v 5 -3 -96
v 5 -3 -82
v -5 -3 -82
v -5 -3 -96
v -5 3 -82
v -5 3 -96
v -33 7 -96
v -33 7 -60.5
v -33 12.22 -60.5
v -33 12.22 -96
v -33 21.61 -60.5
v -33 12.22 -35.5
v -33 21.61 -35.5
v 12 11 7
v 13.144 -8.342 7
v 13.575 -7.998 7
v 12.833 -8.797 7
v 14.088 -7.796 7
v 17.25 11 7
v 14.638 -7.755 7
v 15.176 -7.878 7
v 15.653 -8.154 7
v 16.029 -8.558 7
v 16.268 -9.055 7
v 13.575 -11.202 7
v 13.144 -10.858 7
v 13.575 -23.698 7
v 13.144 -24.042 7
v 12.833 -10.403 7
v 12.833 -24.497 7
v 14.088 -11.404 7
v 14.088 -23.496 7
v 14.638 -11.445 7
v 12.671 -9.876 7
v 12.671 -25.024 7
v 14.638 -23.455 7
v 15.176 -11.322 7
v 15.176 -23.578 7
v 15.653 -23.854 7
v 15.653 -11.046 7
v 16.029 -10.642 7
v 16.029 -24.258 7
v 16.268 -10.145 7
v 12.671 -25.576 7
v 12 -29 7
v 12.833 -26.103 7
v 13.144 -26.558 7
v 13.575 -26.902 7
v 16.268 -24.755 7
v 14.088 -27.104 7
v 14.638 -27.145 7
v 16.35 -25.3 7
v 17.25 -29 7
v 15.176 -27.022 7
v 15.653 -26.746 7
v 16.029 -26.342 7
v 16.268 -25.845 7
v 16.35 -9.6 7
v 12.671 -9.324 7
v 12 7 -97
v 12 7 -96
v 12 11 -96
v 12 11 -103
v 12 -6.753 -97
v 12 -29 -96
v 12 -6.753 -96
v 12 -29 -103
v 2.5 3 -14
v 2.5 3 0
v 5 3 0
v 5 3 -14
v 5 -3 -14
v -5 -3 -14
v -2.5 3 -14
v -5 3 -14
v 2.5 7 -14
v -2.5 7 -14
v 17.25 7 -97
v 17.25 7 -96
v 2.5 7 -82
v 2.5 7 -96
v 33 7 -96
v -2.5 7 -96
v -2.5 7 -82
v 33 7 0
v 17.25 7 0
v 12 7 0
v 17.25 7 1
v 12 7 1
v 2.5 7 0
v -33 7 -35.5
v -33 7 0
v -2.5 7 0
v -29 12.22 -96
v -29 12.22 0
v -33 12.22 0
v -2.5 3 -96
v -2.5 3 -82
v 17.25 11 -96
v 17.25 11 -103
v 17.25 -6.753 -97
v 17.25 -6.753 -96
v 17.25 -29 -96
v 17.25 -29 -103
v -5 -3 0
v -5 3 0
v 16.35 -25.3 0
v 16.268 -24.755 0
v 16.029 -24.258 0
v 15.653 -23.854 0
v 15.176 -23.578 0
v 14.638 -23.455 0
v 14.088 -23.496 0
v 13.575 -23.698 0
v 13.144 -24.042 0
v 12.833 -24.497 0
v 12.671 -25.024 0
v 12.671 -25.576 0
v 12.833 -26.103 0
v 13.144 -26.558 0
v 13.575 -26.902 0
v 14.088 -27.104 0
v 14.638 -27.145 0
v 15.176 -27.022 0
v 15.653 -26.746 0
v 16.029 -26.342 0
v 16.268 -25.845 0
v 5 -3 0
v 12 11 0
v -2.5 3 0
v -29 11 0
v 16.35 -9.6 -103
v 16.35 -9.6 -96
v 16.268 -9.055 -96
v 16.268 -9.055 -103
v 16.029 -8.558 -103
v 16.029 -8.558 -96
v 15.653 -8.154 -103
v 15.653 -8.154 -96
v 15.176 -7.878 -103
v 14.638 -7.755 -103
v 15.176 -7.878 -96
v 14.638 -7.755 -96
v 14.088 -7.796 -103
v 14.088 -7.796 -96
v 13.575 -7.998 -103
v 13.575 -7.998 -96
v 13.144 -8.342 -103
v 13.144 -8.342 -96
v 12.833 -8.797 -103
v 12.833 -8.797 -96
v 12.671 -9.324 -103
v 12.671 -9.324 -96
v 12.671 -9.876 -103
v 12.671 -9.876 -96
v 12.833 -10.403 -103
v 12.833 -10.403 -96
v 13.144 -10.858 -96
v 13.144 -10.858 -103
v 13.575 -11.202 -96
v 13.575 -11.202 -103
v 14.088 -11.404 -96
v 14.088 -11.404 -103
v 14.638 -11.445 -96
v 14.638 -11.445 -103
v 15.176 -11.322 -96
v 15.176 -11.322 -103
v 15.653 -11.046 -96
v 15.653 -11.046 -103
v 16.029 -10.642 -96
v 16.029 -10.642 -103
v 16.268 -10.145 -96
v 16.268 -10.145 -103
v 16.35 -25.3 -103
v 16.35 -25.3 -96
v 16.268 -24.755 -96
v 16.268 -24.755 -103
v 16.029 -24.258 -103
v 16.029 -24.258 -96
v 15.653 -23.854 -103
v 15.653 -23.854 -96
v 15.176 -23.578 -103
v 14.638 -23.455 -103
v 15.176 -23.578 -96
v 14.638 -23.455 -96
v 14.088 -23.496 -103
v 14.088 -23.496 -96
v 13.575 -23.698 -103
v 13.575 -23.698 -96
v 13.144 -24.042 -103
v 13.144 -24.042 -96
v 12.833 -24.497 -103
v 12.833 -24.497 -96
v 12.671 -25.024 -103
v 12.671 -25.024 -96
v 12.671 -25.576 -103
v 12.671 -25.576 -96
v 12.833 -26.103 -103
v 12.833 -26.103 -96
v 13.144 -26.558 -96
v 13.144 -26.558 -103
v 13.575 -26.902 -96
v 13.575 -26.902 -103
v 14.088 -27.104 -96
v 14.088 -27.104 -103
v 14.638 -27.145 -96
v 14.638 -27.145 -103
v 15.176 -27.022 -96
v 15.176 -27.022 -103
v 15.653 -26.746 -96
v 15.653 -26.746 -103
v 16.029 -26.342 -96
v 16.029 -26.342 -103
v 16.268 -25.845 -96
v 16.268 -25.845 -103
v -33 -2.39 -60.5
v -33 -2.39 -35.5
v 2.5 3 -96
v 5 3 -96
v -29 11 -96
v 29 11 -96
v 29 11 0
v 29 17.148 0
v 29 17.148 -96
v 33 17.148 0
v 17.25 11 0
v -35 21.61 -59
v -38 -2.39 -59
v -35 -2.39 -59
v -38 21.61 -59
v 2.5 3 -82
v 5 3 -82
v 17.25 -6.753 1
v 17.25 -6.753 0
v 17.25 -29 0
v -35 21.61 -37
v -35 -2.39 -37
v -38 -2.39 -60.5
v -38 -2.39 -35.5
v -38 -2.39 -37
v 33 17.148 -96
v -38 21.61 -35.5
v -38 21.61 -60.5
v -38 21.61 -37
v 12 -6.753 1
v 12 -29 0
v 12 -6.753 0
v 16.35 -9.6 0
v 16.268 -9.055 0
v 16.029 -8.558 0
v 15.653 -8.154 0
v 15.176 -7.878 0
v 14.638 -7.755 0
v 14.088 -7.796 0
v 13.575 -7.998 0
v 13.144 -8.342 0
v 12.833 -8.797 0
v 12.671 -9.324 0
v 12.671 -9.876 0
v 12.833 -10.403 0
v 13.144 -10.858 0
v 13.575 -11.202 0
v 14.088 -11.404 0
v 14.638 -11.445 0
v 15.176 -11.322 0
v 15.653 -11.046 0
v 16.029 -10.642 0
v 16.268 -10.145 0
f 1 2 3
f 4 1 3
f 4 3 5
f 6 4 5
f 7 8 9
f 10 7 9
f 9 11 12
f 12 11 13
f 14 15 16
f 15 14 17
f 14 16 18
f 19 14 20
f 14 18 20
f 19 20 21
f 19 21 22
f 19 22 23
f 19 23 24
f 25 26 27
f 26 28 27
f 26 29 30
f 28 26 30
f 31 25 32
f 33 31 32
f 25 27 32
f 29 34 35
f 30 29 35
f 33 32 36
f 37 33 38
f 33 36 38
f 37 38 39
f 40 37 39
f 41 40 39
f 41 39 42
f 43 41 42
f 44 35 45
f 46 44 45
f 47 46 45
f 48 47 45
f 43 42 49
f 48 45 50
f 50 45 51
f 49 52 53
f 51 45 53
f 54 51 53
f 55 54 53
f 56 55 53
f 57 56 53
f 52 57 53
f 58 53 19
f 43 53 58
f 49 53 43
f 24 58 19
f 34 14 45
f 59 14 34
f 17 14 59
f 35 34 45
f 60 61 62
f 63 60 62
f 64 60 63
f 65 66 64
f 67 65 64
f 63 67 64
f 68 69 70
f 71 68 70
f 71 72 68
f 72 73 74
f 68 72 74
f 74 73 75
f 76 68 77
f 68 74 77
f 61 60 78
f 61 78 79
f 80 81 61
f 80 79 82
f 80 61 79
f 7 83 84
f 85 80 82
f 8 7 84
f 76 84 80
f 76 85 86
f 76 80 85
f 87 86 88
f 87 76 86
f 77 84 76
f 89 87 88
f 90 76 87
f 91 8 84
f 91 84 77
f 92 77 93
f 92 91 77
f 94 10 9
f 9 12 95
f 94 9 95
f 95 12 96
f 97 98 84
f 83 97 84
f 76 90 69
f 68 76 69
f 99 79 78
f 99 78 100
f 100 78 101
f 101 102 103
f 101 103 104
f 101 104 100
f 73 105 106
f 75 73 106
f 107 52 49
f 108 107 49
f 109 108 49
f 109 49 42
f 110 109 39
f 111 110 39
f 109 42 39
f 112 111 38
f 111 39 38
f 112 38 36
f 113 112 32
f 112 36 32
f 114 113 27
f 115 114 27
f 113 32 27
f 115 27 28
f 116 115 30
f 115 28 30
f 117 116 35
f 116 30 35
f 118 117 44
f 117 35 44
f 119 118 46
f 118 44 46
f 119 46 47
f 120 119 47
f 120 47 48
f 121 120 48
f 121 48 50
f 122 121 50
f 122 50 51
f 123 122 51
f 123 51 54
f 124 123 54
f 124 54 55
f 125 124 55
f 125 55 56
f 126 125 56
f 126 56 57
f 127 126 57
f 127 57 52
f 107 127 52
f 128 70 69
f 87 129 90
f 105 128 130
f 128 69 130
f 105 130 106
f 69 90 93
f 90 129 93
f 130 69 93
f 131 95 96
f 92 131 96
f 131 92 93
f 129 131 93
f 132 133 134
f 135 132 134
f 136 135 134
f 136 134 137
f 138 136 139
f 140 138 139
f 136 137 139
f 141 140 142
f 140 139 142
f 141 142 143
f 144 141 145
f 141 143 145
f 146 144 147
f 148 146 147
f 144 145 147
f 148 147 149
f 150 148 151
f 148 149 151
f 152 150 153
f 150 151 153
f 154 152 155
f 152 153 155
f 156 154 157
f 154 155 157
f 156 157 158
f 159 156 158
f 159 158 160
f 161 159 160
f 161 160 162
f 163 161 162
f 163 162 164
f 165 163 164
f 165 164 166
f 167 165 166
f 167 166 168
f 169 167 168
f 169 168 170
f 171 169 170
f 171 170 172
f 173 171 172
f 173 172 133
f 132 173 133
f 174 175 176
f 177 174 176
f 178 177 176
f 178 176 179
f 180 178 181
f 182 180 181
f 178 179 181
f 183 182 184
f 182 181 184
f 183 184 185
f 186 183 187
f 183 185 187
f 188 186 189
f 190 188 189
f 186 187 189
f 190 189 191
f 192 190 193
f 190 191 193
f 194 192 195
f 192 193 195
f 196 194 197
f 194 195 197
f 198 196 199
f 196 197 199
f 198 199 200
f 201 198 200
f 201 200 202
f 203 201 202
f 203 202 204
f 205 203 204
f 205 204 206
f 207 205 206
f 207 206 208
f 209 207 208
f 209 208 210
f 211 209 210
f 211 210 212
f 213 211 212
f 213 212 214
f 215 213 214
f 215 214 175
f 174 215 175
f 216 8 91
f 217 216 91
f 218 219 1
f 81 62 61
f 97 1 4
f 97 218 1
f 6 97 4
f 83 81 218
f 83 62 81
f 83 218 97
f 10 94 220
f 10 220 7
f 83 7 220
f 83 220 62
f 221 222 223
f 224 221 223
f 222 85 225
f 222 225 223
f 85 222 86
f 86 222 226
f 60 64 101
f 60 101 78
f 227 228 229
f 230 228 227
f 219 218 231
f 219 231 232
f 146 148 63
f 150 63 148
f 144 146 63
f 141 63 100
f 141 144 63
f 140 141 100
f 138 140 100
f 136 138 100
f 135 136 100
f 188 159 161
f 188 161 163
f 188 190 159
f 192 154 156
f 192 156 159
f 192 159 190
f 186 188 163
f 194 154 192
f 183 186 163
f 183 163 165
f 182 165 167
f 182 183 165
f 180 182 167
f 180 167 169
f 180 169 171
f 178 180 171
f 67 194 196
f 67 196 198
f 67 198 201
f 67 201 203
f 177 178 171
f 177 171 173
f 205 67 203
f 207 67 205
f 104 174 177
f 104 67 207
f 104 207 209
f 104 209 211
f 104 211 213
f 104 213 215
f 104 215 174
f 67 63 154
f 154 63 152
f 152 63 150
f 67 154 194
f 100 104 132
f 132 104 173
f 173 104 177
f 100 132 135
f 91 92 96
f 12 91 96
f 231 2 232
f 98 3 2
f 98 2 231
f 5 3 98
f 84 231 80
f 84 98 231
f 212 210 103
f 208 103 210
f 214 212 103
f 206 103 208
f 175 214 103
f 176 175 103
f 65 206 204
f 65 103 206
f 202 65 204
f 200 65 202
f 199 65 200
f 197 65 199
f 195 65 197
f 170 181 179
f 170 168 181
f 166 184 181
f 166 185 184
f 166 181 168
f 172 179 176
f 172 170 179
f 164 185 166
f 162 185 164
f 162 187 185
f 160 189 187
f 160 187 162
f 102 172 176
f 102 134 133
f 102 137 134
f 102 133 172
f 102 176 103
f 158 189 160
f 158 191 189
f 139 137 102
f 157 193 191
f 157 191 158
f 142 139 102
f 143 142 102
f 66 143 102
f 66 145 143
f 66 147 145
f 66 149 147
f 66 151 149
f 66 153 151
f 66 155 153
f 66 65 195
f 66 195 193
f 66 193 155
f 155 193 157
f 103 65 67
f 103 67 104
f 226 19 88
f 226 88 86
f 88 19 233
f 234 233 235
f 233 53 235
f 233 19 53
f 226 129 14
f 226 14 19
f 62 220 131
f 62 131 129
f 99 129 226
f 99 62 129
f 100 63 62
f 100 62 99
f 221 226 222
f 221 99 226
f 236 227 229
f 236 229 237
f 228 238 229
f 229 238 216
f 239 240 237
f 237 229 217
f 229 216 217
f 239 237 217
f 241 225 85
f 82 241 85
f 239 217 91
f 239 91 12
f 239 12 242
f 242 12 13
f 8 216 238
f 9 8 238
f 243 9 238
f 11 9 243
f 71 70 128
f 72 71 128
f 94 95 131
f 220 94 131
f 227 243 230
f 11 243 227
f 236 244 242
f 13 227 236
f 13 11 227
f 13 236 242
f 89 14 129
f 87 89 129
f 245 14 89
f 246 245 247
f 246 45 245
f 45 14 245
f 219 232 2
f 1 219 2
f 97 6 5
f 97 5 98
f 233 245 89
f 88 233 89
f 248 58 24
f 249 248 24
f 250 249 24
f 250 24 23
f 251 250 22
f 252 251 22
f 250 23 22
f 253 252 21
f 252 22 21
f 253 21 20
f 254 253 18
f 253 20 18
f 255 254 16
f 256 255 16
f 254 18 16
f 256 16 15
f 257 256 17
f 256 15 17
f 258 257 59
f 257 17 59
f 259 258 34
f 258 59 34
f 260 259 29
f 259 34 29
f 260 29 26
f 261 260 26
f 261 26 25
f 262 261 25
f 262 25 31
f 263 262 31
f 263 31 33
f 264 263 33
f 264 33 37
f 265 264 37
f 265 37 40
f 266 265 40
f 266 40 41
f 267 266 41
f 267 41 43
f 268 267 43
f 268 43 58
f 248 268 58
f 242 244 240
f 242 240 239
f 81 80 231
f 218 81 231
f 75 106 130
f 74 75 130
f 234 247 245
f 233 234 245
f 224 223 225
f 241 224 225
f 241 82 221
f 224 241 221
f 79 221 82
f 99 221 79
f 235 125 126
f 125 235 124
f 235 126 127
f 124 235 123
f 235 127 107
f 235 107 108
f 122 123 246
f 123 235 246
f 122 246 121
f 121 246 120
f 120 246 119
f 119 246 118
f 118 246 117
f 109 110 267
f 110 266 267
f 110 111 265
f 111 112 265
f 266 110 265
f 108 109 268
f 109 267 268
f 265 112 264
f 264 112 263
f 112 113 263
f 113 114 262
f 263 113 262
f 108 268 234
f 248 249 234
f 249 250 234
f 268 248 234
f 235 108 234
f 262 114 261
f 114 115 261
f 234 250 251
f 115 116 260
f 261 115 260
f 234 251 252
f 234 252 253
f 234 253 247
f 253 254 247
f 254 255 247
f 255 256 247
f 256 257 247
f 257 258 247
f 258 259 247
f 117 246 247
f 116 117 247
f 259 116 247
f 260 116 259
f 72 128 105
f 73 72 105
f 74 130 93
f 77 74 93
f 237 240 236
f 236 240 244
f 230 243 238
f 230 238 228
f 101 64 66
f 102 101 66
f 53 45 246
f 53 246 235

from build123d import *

# Parameters (mm, degrees)
BOSS_EXTRUDE1_DEPTH      = 96
SKETCH3_W                = 68
SKETCH3_H                = 10
CUT_EXTRUDE1_DEPTH       = 96
SKETCH6_W                = 5.25
SKETCH6_H                = 36
BOSS_EXTRUDE3_DEPTH      = 7
BOSS_EXTRUDE3_DEPTH_BACK = 103
SKETCH8_W                = 5.25
SKETCH8_H                = 7
BOSS_EXTRUDE4_DEPTH      = 4
SKETCH10_W               = 5.25
SKETCH10_H               = 7
BOSS_EXTRUDE5_DEPTH      = 4
SKETCH11_W               = 96
SKETCH11_H               = 36
CUT_EXTRUDE2_DEPTH       = 101
SKETCH12_R               = 1.85
CUT_EXTRUDE3_DEPTH       = 111
SKETCH13_W               = 96
SKETCH13_H               = 3.5
CUT_EXTRUDE4_DEPTH       = 10
SKETCH14_W               = 1
SKETCH14_H               = 13.753189639
CUT_EXTRUDE5_DEPTH       = 10
SKETCH15_W               = 25
SKETCH15_H               = 24
BOSS_EXTRUDE6_DEPTH      = 5
SKETCH16_W               = 22
SKETCH16_H               = 24
CUT_EXTRUDE6_DEPTH       = 3


with BuildPart() as part:
    # Sketch1 → Boss-Extrude1 (new body)
    with BuildSketch(Plane.XY):
        Polygon((2.5, 3), (5, 3), (5, -3), (-5, -3), (-5, 3), (-2.5, 3), (-2.5, 7), (-33, 7), (-33, 15.720359308), (-29, 15.720359308), (-29, 11), (29, 11), (29, 17.148290328), (33, 17.148290328), (33, 7), (2.5, 7), align=None)
    extrude(amount=-BOSS_EXTRUDE1_DEPTH)

    # Sketch3 → Cut-Extrude1 (cut)
    with BuildSketch(Plane.ZY.offset(5)):
        with Locations((-48, 2)):
            Rectangle(SKETCH3_W, SKETCH3_H)
    extrude(amount=-CUT_EXTRUDE1_DEPTH, mode=Mode.SUBTRACT)

    # Sketch6 → Boss-Extrude3 (add, two sides)
    with BuildSketch(Plane.XY) as boss_extrude3_sk:
        with Locations((14.625, -11)):
            Rectangle(SKETCH6_W, SKETCH6_H)
    extrude(amount=BOSS_EXTRUDE3_DEPTH)
    extrude(boss_extrude3_sk.sketch, amount=-BOSS_EXTRUDE3_DEPTH_BACK)

    # Sketch8 → Boss-Extrude4 (add)
    with BuildSketch(Plane(origin=(0, 7, 0), x_dir=(1, 0, 0), z_dir=(0, 1, 0))):
        with Locations((14.625, 99.5)):
            Rectangle(SKETCH8_W, SKETCH8_H)
    extrude(amount=BOSS_EXTRUDE4_DEPTH)

    # Sketch10 → Boss-Extrude5 (add)
    with BuildSketch(Plane(origin=(0, 7, 0), x_dir=(1, 0, 0), z_dir=(0, 1, 0))):
        with Locations((14.625, -3.5)):
            Rectangle(SKETCH10_W, SKETCH10_H)
    extrude(amount=BOSS_EXTRUDE5_DEPTH)

    # Sketch11 → Cut-Extrude2 (cut)
    with BuildSketch(Plane.ZY.offset(-12)):
        with Locations((-48, -11)):
            Rectangle(SKETCH11_W, SKETCH11_H)
    extrude(amount=-CUT_EXTRUDE2_DEPTH, mode=Mode.SUBTRACT)

    # Sketch12 → Cut-Extrude3 (cut, through all)
    with BuildSketch(Plane.XY.offset(7)):
        with Locations((14.5, -25.3)):
            Circle(SKETCH12_R)
        with Locations((14.5, -9.6)):
            Circle(SKETCH12_R)
    extrude(amount=-CUT_EXTRUDE3_DEPTH, mode=Mode.SUBTRACT)

    # Sketch13 → Cut-Extrude4 (cut)
    with BuildSketch(Plane.ZY.offset(33)):
        with Locations((-48, 13.970359308)):
            Rectangle(SKETCH13_W, SKETCH13_H)
    extrude(amount=-CUT_EXTRUDE4_DEPTH, mode=Mode.SUBTRACT)

    # Sketch14 → Cut-Extrude5 (cut)
    with BuildSketch(Plane.ZY.offset(-12)):
        with Locations((0.5, 0.12340518)):
            Rectangle(SKETCH14_W, SKETCH14_H)
        with Locations((-96.5, 0.12340518)):
            Rectangle(SKETCH14_W, SKETCH14_H)
    extrude(amount=-CUT_EXTRUDE5_DEPTH, mode=Mode.SUBTRACT)

    # Sketch15 → Boss-Extrude6 (add)
    with BuildSketch(Plane.ZY.offset(33)):
        with Locations((-48, 9.610179654)):
            Rectangle(SKETCH15_W, SKETCH15_H)
    extrude(amount=BOSS_EXTRUDE6_DEPTH)

    # Sketch16 → Cut-Extrude6 (cut)
    with BuildSketch(Plane.ZY.offset(38)):
        with Locations((-48, 9.610179654)):
            Rectangle(SKETCH16_W, SKETCH16_H)
    extrude(amount=-CUT_EXTRUDE6_DEPTH, mode=Mode.SUBTRACT)


solid = part.part
